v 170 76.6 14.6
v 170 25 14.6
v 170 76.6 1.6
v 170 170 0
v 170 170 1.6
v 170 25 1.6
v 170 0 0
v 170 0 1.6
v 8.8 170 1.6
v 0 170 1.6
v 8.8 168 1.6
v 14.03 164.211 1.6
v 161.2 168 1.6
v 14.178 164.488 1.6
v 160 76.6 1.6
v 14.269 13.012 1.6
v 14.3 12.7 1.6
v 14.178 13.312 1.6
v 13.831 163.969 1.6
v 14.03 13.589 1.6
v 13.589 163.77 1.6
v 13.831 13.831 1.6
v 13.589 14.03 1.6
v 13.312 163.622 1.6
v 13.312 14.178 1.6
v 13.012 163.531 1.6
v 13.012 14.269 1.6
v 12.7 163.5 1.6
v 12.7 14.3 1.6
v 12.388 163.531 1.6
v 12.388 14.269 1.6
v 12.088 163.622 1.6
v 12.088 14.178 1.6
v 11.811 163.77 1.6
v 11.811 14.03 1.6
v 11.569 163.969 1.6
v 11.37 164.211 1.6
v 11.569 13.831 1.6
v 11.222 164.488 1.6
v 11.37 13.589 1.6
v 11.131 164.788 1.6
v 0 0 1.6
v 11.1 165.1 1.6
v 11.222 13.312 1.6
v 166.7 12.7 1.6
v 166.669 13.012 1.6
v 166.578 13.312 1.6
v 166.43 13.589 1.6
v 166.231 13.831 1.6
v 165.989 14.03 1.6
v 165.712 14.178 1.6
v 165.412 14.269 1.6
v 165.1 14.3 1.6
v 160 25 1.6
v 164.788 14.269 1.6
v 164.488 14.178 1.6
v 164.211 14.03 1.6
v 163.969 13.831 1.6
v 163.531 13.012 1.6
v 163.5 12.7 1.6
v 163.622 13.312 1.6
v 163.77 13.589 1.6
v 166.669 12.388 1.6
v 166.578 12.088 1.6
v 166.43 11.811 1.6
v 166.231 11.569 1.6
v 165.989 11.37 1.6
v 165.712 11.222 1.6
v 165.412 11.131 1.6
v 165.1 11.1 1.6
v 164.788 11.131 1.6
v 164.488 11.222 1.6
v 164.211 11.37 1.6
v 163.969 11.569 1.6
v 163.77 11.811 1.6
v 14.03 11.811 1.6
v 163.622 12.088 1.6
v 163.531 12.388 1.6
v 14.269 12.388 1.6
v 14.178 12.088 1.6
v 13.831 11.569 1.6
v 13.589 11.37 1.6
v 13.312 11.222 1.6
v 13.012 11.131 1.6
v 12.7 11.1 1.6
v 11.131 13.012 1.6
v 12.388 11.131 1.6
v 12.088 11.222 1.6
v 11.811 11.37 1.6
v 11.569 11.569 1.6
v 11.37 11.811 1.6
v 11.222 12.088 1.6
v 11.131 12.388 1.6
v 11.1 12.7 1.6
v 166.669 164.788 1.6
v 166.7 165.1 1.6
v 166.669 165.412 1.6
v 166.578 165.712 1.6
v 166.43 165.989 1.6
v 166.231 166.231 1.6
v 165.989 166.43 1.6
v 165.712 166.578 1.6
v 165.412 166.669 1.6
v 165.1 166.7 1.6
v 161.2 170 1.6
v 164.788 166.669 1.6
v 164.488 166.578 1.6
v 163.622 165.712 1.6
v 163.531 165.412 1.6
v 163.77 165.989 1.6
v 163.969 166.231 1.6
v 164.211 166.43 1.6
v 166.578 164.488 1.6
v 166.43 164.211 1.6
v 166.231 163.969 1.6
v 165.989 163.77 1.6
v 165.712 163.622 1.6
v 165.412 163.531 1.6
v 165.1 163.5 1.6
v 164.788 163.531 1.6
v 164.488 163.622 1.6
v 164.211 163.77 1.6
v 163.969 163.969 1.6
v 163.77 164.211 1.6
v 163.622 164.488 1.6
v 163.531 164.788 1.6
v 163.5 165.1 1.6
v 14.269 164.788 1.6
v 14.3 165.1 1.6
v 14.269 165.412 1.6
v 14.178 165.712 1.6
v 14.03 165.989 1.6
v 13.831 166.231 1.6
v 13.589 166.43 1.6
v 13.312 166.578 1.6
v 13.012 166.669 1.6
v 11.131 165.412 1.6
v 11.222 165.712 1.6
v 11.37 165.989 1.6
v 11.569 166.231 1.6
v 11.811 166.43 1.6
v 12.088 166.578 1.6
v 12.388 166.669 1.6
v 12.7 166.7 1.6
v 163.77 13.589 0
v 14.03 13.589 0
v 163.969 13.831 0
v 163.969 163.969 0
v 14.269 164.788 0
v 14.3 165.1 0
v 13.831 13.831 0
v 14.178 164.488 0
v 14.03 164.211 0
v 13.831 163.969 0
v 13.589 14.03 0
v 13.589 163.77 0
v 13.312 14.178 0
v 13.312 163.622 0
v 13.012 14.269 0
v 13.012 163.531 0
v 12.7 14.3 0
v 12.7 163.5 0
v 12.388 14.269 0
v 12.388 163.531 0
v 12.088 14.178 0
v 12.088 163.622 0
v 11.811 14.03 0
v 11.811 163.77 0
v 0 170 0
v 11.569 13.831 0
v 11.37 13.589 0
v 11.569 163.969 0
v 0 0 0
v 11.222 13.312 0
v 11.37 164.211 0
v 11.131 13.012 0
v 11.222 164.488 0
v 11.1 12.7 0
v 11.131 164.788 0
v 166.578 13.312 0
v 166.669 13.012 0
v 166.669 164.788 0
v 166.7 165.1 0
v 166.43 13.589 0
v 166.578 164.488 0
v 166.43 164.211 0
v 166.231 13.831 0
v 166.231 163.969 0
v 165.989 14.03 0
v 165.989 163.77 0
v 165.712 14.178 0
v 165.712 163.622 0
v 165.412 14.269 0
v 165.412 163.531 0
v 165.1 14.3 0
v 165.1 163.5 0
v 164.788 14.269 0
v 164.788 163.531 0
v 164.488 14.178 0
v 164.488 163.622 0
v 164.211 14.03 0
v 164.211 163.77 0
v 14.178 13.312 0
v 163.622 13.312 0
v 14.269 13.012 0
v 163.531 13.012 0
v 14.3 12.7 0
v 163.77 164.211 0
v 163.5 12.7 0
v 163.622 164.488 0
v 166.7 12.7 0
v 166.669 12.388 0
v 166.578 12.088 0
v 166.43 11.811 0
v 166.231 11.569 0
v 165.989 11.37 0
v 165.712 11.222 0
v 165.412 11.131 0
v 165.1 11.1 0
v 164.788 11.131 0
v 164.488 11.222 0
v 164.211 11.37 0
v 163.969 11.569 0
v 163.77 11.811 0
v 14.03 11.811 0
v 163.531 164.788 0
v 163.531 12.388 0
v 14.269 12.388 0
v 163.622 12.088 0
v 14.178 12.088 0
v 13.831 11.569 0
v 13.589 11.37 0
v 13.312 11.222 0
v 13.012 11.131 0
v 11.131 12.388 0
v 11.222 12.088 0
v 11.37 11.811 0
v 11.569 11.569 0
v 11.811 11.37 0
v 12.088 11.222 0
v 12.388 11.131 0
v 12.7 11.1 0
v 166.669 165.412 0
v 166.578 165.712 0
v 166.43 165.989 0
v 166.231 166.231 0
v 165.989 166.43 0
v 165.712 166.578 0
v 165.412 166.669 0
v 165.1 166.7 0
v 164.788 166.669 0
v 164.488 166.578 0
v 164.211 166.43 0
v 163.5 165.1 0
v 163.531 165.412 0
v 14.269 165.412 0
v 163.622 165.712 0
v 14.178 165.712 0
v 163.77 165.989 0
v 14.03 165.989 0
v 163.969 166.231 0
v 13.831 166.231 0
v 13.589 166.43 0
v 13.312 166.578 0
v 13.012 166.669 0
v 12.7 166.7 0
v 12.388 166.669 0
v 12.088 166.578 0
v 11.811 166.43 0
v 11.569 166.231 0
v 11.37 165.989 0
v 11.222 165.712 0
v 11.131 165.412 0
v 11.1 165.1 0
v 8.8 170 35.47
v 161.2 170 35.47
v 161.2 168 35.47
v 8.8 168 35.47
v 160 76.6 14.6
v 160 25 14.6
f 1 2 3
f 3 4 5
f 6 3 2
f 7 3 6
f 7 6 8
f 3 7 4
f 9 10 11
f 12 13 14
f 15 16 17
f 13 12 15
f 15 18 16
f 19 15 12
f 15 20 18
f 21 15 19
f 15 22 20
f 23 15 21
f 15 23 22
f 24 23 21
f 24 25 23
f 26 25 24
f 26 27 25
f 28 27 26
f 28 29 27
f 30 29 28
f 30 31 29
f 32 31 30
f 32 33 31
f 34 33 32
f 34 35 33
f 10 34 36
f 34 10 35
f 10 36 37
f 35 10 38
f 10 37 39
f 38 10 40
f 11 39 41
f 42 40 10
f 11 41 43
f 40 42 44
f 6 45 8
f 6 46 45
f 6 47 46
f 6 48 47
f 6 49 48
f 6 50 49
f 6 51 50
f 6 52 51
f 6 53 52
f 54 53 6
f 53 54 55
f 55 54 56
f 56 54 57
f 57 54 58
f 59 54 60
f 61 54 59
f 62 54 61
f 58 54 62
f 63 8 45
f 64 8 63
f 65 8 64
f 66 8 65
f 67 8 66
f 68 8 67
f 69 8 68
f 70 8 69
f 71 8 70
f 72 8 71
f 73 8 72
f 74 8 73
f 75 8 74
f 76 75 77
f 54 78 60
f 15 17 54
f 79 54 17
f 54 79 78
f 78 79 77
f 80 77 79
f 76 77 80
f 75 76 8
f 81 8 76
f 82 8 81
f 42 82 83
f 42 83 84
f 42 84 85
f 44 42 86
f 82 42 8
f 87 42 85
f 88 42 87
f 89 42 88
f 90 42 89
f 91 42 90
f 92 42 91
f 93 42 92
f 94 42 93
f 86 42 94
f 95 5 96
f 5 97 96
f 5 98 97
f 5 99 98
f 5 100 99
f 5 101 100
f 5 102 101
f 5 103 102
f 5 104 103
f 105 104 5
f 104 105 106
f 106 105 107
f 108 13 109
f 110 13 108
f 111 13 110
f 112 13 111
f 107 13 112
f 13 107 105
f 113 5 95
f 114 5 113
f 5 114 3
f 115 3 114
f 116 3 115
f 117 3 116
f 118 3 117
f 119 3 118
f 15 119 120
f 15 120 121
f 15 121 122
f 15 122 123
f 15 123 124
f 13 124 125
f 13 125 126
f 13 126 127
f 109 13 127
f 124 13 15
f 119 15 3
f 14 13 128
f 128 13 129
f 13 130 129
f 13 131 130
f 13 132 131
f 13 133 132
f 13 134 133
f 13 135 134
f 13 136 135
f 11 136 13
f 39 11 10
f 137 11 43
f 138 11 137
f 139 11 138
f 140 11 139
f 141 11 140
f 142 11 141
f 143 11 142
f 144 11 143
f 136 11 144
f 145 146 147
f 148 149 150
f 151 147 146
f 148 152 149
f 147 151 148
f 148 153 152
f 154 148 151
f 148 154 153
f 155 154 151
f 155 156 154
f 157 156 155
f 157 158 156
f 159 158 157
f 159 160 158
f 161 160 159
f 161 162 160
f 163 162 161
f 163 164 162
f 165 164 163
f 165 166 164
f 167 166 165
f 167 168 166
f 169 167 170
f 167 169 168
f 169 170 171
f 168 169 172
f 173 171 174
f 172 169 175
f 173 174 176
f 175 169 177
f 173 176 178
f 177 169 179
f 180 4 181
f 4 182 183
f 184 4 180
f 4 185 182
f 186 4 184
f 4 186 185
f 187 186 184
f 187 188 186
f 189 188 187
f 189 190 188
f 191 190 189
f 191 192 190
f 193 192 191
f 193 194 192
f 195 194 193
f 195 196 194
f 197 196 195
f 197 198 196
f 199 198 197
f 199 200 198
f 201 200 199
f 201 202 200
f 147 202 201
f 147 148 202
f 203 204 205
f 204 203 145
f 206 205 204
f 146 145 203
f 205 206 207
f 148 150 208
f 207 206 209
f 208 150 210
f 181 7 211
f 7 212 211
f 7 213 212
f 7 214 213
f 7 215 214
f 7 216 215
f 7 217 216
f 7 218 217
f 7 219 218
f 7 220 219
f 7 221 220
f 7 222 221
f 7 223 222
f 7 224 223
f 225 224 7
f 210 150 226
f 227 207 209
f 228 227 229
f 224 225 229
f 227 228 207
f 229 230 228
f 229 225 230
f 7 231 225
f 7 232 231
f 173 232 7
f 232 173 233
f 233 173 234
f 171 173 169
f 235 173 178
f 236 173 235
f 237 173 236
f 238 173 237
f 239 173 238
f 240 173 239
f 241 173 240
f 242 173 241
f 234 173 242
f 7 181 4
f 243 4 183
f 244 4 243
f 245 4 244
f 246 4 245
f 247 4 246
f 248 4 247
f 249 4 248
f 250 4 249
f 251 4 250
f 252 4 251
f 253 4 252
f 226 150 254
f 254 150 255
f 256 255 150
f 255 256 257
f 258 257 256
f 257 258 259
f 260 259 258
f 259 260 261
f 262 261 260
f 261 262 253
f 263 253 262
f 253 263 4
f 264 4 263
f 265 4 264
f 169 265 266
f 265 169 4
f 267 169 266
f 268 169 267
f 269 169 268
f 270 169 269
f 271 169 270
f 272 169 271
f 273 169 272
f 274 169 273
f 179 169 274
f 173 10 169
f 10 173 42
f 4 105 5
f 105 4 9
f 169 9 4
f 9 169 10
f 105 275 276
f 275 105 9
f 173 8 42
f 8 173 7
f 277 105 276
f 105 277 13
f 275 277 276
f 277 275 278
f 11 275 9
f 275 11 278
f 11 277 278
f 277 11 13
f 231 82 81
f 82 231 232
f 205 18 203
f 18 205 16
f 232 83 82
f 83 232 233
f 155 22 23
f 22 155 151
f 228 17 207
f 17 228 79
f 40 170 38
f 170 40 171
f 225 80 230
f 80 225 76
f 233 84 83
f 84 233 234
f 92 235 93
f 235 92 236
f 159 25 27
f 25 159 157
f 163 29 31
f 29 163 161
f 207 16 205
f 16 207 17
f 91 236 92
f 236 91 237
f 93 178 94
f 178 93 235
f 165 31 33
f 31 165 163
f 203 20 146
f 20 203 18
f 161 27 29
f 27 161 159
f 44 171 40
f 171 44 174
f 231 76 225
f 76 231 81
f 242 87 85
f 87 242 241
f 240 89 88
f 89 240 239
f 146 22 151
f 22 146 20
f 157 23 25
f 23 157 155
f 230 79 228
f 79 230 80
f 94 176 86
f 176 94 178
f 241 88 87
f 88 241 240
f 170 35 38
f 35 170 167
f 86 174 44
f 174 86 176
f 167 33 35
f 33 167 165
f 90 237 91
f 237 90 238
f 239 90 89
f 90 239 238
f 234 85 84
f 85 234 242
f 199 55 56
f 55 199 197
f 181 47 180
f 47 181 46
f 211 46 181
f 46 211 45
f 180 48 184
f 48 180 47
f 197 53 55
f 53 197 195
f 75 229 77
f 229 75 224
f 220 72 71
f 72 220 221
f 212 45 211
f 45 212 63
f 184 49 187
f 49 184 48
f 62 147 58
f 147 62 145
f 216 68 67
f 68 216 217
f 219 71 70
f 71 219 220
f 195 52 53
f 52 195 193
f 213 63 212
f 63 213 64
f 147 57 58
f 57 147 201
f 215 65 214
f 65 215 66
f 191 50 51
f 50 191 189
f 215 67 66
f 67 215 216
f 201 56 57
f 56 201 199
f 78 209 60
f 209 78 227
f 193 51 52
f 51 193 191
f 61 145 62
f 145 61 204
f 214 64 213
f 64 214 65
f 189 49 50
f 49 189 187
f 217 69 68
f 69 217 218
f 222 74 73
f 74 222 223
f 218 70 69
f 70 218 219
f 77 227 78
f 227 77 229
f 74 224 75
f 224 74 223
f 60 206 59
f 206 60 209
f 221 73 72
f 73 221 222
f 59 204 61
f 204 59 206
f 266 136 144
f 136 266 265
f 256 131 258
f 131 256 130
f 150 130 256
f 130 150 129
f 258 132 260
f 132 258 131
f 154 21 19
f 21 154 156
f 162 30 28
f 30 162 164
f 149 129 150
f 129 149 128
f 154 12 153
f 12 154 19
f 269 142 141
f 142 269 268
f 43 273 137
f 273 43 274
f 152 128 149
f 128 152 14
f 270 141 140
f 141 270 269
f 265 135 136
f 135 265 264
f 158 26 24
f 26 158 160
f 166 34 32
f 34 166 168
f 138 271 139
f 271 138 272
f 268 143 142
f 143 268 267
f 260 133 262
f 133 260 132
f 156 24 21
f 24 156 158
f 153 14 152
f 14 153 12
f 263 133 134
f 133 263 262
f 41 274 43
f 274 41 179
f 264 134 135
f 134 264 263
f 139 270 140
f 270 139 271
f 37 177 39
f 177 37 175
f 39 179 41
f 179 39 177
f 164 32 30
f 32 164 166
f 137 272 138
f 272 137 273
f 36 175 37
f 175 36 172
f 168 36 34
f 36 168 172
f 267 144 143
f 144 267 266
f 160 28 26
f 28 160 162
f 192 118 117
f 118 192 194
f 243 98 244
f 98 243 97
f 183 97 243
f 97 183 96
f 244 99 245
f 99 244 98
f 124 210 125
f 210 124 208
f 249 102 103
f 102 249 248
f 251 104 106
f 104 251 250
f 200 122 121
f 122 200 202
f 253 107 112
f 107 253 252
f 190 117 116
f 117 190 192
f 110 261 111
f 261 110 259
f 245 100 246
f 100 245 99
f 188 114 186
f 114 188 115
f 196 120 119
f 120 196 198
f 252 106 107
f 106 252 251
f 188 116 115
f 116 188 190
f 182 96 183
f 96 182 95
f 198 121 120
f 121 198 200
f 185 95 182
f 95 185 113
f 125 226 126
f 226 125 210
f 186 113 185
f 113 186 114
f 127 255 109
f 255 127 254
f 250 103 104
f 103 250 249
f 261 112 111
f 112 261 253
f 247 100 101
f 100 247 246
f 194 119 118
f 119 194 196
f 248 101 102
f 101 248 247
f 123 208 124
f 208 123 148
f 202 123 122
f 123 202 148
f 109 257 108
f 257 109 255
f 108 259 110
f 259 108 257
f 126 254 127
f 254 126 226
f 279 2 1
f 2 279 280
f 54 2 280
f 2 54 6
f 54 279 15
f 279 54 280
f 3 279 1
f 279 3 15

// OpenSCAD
// file: atx_24pin_connector.scad
// ATX 24-Pin Power Connector
// Standard motherboard power connector

module atx_24pin_connector() {
    // ATX 24-pin connector dimensions
    conn_length = 51.6;
    conn_width = 10;
    conn_height = 13;

    color("black") {
        cube([conn_length, conn_width, conn_height]);
    }
}

// Preview
atx_24pin_connector();
// file: ../../case/dimensions.scad
// Shared dimensions for all case components
// This file defines common parameters used across multiple case parts

// --- Wall and Material ---
wall_thickness = 3;

// --- Motherboard (Mini-ITX) ---
mobo_width = 170;
mobo_depth = 170;
mobo_pcb_thickness = 1.6;

// --- Standoffs ---
standoff_height = 6;  // Female thread portion of M3x10+6mm male-female standoff
standoff_hole_radius = 1.6;  // M3 clearance (deprecated - see integrated bottom panel design)
standoff_locations = [
    [12.7, 12.7],
    [165.1, 12.7],
    [12.7, 165.1],
    [165.1, 165.1]
];

// --- Standoff Hexagonal Receptacles (Integrated Bottom Panel Design) ---
standoff_boss_height = 2.5;              // Height of hex boss above panel interior surface
standoff_hex_size_flat_to_flat = 5.5;   // Hex size for M3 screw head (flat-to-flat)
standoff_hex_size_point_to_point = 6.35; // Hex size point-to-point (calculated from F-F)
standoff_pocket_depth = 2.2;             // Depth of hex recess for screw head
standoff_boss_diameter = 6.85;           // Overall boss diameter (hex point + FDM tolerance)
standoff_mounting_screw_length = 8;      // M3 x 8mm cap screw (recommended)
standoff_screw_clearance_hole = 3.3;     // M3 clearance hole + FDM tolerance

// --- I/O Shield ---
// Standard ATX I/O shield dimensions
io_shield_width = 158.75;   // 6.25 inches (standard ATX)
io_shield_height = 44.45;   // 1.75 inches (standard ATX)
io_shield_x_offset = (mobo_width - io_shield_width) / 2;
io_shield_z_offset = 5;     // 5mm from bottom of plate

// --- Backplate ---
backplate_height = 88.9;    // 3.5 inches
backplate_thickness = wall_thickness;

// --- CPU Cooler (Noctua NH-L12S) - Minimal/NAS configurations ---
cooler_width = 128;
cooler_depth = 146;
cooler_base_height = 35;      // Base plate and heatpipes
cooler_fan_height = 15;       // 120mm x 15mm fan (NF-A12x15)
cooler_fins_height = 20;      // Heatsink fins on top
cooler_total_height = cooler_base_height + cooler_fan_height + cooler_fins_height;  // 70mm

// --- CPU Cooler (Noctua NH-L9) - Pico configuration ---
cooler_nh_l9_width = 95;
cooler_nh_l9_depth = 95;
cooler_nh_l9_base_height = 5;       // CPU contact base
cooler_nh_l9_heatsink_height = 18;  // Aluminum fins
cooler_nh_l9_fan_height = 14;       // 92mm x 14mm fan
cooler_nh_l9_total_height = cooler_nh_l9_base_height + cooler_nh_l9_heatsink_height + cooler_nh_l9_fan_height;  // 37mm

// --- Power Supplies ---
// Flex ATX (from technical drawing)
// Standing orientation: 40mm wide (X), 150mm deep (Y), 80mm tall (Z)
flex_atx_width = 40.0;      // A: Width (X - thin side, standing)
flex_atx_length = 150.0;    // B: Length (Y - depth)
flex_atx_height = 80.0;     // G: Height (Z - tall side, standing)

// Flex ATX Mounting holes - 8-32 UNC thread (4 places on rear 40x80mm face)
flex_atx_mount_hole_radius = 2.1;   // 8-32 clearance (~4.2mm dia)
flex_atx_mount_x_inset = 5;         // Distance from left/right edges (corrected from 12.5)
flex_atx_mount_z_inset = 5;         // Distance from top/bottom edges (corrected from 8.25)

// Calculated mounting hole positions (X, Z pairs relative to PSU origin)
// Note: Only 3 holes - top-right (coords) removed where C14 inlet is located
// When viewing from back: top-right (coords) = top-left (view)
flex_atx_mount_holes = [
    [flex_atx_mount_x_inset, flex_atx_mount_z_inset],                                    // Bottom-left (coords) = Bottom-right (view)
    [flex_atx_width - flex_atx_mount_x_inset, flex_atx_mount_z_inset],                   // Bottom-right (coords) = Bottom-left (view)
    [flex_atx_mount_x_inset, flex_atx_height - flex_atx_mount_z_inset]                   // Top-left (coords) = Top-right (view)
    // Top-right (coords) removed - C14 power inlet is here = Top-left (view)
];

// SFX
sfx_length = 125;
sfx_width = 100;
sfx_height = 63.5;

// --- HDD 3.5" Dimensions ---
hdd_width = 101.6;
hdd_length = 147;
hdd_height = 26.1;

// --- NAS 2-Disk Config ---
// 2 HDDs side-by-side (controlling dimension for case width)
// See SPEC.md Section 3.3 for design rationale
nas_2disk_rail_width = 2;
nas_2disk_gap = 5;           // Gap between bays
nas_2disk_padding = 2;       // Clearance around HDDs
nas_2disk_bay_width = hdd_width + 2 * nas_2disk_rail_width;  // ~105.6mm per bay
nas_2disk_inner_width = 2 * nas_2disk_bay_width + nas_2disk_gap;  // ~216.2mm
nas_2disk_width = nas_2disk_inner_width + 2 * (wall_thickness + nas_2disk_padding);  // ~226mm

// --- PSU Compartment ---
// Flex ATX PSU in standing orientation (40mm width)
flex_atx_standing_width = flex_atx_width;  // 40mm (already in standing orientation)
psu_compartment_width = nas_2disk_width - mobo_width;  // ~56mm (40mm PSU + 16mm clearance)

// --- Interior Chamber Height (standoffs + motherboard + cooler) ---
interior_chamber_height = standoff_height + mobo_pcb_thickness + cooler_total_height;  // ~94mm

// --- Minimal Config External Dimensions ---
// Motherboard area only (without PSU)
minimal_mobo_exterior_width = mobo_width + 2 * wall_thickness;   // 176mm
minimal_mobo_exterior_depth = mobo_depth + 2 * wall_thickness;   // 176mm
minimal_exterior_height = interior_chamber_height + 2 * wall_thickness;   // ~100mm

// With Flex ATX PSU next to motherboard
// Width controlled by NAS 2-disk HDD layout (see SPEC.md Section 3.3)
minimal_with_psu_width = nas_2disk_width;  // ~226mm (PSU compartment = 56mm, PSU on side = 40mm)

// --- Interior Panel Dimensions (top/bottom panels fit between walls) ---
interior_panel_width = minimal_with_psu_width - 2 * wall_thickness;  // ~220mm
interior_panel_depth = mobo_depth;                                    // 170mm

// --- Side Panel Dimensions (left/right panels form exterior walls) ---
side_panel_height = minimal_exterior_height;                          // ~100mm
side_panel_depth = mobo_depth + 2 * wall_thickness;                   // 176mm

// --- Front/Back Panel Dimensions (fit between side walls, full exterior height) ---
front_back_panel_width = interior_panel_width;                        // ~220mm
front_back_panel_height = side_panel_height;                          // ~100mm (full exterior)

// --- Ventilation ---
honeycomb_radius = 3;
vent_padding = 5;

// --- Screw Holes for Panel Assembly ---
panel_screw_radius = 1.6;  // M3
panel_screw_inset = 8;     // Distance from edge

// --- GPU ---
gpu_length = 320;          // Max GPU length
gpu_height = 140;          // GPU PCB + cooler height
gpu_width = 60;            // 3 slots

// --- GPU Config External Dimensions ---
// From SPEC.md Section 8.4
gpu_config_width = 171;    // mm
gpu_config_depth = 378;    // mm
gpu_config_height = 190;   // mm

// --- Fans ---
fan_120_size = 120;
fan_120_thickness = 25;
fan_140_size = 140;
fan_140_thickness = 25;

// --- AIO Radiator ---
radiator_240_length = 275;
radiator_240_width = 120;
radiator_240_thickness = 27;

// --- NAS Many-Disk Config ---
// 5-8 drives mounted vertically (on narrowest side)
nas_many_drive_count = 6;  // Default 6 drives
nas_many_drive_spacing = 5;
nas_many_enclosure_height = hdd_width + wall_thickness + 5;  // ~110mm (drives on side)

// --- Power Inlet C14 ---
c14_width = 50;
c14_height = 27;
c14_depth = 30;

// --- Open Air Frame ---
// Frame cylinder height (from motherboard surface to inside panel face)
// Derived: interior_chamber_height - standoff_height - mobo_pcb_thickness
frame_cylinder_height = interior_chamber_height - standoff_height - mobo_pcb_thickness;  // ~86mm
frame_cylinder_outer_diameter = 8;     // Outer diameter
frame_cylinder_inner_diameter = 3.2;   // M3 clearance for standoff stud
frame_cylinder_thread_depth = 6;       // Matches extended_standoff_male_height (M3x6+6mm)
// main file
// Mini-ITX Motherboard Base
// Contains: PCB + I/O shield + 24-pin ATX connector + mounting holes
// This is the foundation for all motherboard assemblies
//
// Coordinate System:
// X-axis: 0 = left side, increases toward right
// Y-axis: 0 = front, increases toward back (I/O shield at back)
// Z-axis: 0 = bottom of motherboard PCB, increases upward
//
// Note: Standoffs are now part of base_assembly, not the motherboard module

include <../../case/dimensions.scad>
use <atx_24pin_connector.scad>

module motherboard() {
    mobo_width = 170;
    mobo_depth = 170;
    mobo_thickness = 1.6;

    io_shield_width = 152.4;
    io_shield_height = 33.87;
    io_shield_thickness = 2;
    io_shield_x_offset = (mobo_width - io_shield_width) / 2;

    union() {
        // Motherboard PCB with mounting holes
        color("purple") {
            difference() {
                union() {
                    // Motherboard PCB
                    cube([mobo_width, mobo_depth, mobo_thickness]);
                    // I/O Shield
                    translate([io_shield_x_offset, mobo_depth - io_shield_thickness, mobo_thickness]) {
                        cube([io_shield_width, io_shield_thickness, io_shield_height]);
                    }
                }
                // Mounting holes at Mini-ITX standoff locations
                for (pos = standoff_locations) {
                    translate([pos[0], pos[1], -0.1]) {
                        cylinder(h = mobo_thickness + 0.2, r = standoff_hole_radius, $fn = 32);
                    }
                }
            }
        }

        // 24-pin ATX Connector (right edge, 25mm from front)
        // Rotated 90° so longest side runs along Y axis
        translate([mobo_width, 25, mobo_thickness]) {
            rotate([0, 0, 90]) {
                atx_24pin_connector();
            }
        }

        // Note: Standoffs removed from motherboard module (legacy code)
        // Standoffs are now part of base_assembly (integrated bottom panel design)
        // See modules/case/base/base_assembly.scad
    }
}

// Preview
motherboard();
